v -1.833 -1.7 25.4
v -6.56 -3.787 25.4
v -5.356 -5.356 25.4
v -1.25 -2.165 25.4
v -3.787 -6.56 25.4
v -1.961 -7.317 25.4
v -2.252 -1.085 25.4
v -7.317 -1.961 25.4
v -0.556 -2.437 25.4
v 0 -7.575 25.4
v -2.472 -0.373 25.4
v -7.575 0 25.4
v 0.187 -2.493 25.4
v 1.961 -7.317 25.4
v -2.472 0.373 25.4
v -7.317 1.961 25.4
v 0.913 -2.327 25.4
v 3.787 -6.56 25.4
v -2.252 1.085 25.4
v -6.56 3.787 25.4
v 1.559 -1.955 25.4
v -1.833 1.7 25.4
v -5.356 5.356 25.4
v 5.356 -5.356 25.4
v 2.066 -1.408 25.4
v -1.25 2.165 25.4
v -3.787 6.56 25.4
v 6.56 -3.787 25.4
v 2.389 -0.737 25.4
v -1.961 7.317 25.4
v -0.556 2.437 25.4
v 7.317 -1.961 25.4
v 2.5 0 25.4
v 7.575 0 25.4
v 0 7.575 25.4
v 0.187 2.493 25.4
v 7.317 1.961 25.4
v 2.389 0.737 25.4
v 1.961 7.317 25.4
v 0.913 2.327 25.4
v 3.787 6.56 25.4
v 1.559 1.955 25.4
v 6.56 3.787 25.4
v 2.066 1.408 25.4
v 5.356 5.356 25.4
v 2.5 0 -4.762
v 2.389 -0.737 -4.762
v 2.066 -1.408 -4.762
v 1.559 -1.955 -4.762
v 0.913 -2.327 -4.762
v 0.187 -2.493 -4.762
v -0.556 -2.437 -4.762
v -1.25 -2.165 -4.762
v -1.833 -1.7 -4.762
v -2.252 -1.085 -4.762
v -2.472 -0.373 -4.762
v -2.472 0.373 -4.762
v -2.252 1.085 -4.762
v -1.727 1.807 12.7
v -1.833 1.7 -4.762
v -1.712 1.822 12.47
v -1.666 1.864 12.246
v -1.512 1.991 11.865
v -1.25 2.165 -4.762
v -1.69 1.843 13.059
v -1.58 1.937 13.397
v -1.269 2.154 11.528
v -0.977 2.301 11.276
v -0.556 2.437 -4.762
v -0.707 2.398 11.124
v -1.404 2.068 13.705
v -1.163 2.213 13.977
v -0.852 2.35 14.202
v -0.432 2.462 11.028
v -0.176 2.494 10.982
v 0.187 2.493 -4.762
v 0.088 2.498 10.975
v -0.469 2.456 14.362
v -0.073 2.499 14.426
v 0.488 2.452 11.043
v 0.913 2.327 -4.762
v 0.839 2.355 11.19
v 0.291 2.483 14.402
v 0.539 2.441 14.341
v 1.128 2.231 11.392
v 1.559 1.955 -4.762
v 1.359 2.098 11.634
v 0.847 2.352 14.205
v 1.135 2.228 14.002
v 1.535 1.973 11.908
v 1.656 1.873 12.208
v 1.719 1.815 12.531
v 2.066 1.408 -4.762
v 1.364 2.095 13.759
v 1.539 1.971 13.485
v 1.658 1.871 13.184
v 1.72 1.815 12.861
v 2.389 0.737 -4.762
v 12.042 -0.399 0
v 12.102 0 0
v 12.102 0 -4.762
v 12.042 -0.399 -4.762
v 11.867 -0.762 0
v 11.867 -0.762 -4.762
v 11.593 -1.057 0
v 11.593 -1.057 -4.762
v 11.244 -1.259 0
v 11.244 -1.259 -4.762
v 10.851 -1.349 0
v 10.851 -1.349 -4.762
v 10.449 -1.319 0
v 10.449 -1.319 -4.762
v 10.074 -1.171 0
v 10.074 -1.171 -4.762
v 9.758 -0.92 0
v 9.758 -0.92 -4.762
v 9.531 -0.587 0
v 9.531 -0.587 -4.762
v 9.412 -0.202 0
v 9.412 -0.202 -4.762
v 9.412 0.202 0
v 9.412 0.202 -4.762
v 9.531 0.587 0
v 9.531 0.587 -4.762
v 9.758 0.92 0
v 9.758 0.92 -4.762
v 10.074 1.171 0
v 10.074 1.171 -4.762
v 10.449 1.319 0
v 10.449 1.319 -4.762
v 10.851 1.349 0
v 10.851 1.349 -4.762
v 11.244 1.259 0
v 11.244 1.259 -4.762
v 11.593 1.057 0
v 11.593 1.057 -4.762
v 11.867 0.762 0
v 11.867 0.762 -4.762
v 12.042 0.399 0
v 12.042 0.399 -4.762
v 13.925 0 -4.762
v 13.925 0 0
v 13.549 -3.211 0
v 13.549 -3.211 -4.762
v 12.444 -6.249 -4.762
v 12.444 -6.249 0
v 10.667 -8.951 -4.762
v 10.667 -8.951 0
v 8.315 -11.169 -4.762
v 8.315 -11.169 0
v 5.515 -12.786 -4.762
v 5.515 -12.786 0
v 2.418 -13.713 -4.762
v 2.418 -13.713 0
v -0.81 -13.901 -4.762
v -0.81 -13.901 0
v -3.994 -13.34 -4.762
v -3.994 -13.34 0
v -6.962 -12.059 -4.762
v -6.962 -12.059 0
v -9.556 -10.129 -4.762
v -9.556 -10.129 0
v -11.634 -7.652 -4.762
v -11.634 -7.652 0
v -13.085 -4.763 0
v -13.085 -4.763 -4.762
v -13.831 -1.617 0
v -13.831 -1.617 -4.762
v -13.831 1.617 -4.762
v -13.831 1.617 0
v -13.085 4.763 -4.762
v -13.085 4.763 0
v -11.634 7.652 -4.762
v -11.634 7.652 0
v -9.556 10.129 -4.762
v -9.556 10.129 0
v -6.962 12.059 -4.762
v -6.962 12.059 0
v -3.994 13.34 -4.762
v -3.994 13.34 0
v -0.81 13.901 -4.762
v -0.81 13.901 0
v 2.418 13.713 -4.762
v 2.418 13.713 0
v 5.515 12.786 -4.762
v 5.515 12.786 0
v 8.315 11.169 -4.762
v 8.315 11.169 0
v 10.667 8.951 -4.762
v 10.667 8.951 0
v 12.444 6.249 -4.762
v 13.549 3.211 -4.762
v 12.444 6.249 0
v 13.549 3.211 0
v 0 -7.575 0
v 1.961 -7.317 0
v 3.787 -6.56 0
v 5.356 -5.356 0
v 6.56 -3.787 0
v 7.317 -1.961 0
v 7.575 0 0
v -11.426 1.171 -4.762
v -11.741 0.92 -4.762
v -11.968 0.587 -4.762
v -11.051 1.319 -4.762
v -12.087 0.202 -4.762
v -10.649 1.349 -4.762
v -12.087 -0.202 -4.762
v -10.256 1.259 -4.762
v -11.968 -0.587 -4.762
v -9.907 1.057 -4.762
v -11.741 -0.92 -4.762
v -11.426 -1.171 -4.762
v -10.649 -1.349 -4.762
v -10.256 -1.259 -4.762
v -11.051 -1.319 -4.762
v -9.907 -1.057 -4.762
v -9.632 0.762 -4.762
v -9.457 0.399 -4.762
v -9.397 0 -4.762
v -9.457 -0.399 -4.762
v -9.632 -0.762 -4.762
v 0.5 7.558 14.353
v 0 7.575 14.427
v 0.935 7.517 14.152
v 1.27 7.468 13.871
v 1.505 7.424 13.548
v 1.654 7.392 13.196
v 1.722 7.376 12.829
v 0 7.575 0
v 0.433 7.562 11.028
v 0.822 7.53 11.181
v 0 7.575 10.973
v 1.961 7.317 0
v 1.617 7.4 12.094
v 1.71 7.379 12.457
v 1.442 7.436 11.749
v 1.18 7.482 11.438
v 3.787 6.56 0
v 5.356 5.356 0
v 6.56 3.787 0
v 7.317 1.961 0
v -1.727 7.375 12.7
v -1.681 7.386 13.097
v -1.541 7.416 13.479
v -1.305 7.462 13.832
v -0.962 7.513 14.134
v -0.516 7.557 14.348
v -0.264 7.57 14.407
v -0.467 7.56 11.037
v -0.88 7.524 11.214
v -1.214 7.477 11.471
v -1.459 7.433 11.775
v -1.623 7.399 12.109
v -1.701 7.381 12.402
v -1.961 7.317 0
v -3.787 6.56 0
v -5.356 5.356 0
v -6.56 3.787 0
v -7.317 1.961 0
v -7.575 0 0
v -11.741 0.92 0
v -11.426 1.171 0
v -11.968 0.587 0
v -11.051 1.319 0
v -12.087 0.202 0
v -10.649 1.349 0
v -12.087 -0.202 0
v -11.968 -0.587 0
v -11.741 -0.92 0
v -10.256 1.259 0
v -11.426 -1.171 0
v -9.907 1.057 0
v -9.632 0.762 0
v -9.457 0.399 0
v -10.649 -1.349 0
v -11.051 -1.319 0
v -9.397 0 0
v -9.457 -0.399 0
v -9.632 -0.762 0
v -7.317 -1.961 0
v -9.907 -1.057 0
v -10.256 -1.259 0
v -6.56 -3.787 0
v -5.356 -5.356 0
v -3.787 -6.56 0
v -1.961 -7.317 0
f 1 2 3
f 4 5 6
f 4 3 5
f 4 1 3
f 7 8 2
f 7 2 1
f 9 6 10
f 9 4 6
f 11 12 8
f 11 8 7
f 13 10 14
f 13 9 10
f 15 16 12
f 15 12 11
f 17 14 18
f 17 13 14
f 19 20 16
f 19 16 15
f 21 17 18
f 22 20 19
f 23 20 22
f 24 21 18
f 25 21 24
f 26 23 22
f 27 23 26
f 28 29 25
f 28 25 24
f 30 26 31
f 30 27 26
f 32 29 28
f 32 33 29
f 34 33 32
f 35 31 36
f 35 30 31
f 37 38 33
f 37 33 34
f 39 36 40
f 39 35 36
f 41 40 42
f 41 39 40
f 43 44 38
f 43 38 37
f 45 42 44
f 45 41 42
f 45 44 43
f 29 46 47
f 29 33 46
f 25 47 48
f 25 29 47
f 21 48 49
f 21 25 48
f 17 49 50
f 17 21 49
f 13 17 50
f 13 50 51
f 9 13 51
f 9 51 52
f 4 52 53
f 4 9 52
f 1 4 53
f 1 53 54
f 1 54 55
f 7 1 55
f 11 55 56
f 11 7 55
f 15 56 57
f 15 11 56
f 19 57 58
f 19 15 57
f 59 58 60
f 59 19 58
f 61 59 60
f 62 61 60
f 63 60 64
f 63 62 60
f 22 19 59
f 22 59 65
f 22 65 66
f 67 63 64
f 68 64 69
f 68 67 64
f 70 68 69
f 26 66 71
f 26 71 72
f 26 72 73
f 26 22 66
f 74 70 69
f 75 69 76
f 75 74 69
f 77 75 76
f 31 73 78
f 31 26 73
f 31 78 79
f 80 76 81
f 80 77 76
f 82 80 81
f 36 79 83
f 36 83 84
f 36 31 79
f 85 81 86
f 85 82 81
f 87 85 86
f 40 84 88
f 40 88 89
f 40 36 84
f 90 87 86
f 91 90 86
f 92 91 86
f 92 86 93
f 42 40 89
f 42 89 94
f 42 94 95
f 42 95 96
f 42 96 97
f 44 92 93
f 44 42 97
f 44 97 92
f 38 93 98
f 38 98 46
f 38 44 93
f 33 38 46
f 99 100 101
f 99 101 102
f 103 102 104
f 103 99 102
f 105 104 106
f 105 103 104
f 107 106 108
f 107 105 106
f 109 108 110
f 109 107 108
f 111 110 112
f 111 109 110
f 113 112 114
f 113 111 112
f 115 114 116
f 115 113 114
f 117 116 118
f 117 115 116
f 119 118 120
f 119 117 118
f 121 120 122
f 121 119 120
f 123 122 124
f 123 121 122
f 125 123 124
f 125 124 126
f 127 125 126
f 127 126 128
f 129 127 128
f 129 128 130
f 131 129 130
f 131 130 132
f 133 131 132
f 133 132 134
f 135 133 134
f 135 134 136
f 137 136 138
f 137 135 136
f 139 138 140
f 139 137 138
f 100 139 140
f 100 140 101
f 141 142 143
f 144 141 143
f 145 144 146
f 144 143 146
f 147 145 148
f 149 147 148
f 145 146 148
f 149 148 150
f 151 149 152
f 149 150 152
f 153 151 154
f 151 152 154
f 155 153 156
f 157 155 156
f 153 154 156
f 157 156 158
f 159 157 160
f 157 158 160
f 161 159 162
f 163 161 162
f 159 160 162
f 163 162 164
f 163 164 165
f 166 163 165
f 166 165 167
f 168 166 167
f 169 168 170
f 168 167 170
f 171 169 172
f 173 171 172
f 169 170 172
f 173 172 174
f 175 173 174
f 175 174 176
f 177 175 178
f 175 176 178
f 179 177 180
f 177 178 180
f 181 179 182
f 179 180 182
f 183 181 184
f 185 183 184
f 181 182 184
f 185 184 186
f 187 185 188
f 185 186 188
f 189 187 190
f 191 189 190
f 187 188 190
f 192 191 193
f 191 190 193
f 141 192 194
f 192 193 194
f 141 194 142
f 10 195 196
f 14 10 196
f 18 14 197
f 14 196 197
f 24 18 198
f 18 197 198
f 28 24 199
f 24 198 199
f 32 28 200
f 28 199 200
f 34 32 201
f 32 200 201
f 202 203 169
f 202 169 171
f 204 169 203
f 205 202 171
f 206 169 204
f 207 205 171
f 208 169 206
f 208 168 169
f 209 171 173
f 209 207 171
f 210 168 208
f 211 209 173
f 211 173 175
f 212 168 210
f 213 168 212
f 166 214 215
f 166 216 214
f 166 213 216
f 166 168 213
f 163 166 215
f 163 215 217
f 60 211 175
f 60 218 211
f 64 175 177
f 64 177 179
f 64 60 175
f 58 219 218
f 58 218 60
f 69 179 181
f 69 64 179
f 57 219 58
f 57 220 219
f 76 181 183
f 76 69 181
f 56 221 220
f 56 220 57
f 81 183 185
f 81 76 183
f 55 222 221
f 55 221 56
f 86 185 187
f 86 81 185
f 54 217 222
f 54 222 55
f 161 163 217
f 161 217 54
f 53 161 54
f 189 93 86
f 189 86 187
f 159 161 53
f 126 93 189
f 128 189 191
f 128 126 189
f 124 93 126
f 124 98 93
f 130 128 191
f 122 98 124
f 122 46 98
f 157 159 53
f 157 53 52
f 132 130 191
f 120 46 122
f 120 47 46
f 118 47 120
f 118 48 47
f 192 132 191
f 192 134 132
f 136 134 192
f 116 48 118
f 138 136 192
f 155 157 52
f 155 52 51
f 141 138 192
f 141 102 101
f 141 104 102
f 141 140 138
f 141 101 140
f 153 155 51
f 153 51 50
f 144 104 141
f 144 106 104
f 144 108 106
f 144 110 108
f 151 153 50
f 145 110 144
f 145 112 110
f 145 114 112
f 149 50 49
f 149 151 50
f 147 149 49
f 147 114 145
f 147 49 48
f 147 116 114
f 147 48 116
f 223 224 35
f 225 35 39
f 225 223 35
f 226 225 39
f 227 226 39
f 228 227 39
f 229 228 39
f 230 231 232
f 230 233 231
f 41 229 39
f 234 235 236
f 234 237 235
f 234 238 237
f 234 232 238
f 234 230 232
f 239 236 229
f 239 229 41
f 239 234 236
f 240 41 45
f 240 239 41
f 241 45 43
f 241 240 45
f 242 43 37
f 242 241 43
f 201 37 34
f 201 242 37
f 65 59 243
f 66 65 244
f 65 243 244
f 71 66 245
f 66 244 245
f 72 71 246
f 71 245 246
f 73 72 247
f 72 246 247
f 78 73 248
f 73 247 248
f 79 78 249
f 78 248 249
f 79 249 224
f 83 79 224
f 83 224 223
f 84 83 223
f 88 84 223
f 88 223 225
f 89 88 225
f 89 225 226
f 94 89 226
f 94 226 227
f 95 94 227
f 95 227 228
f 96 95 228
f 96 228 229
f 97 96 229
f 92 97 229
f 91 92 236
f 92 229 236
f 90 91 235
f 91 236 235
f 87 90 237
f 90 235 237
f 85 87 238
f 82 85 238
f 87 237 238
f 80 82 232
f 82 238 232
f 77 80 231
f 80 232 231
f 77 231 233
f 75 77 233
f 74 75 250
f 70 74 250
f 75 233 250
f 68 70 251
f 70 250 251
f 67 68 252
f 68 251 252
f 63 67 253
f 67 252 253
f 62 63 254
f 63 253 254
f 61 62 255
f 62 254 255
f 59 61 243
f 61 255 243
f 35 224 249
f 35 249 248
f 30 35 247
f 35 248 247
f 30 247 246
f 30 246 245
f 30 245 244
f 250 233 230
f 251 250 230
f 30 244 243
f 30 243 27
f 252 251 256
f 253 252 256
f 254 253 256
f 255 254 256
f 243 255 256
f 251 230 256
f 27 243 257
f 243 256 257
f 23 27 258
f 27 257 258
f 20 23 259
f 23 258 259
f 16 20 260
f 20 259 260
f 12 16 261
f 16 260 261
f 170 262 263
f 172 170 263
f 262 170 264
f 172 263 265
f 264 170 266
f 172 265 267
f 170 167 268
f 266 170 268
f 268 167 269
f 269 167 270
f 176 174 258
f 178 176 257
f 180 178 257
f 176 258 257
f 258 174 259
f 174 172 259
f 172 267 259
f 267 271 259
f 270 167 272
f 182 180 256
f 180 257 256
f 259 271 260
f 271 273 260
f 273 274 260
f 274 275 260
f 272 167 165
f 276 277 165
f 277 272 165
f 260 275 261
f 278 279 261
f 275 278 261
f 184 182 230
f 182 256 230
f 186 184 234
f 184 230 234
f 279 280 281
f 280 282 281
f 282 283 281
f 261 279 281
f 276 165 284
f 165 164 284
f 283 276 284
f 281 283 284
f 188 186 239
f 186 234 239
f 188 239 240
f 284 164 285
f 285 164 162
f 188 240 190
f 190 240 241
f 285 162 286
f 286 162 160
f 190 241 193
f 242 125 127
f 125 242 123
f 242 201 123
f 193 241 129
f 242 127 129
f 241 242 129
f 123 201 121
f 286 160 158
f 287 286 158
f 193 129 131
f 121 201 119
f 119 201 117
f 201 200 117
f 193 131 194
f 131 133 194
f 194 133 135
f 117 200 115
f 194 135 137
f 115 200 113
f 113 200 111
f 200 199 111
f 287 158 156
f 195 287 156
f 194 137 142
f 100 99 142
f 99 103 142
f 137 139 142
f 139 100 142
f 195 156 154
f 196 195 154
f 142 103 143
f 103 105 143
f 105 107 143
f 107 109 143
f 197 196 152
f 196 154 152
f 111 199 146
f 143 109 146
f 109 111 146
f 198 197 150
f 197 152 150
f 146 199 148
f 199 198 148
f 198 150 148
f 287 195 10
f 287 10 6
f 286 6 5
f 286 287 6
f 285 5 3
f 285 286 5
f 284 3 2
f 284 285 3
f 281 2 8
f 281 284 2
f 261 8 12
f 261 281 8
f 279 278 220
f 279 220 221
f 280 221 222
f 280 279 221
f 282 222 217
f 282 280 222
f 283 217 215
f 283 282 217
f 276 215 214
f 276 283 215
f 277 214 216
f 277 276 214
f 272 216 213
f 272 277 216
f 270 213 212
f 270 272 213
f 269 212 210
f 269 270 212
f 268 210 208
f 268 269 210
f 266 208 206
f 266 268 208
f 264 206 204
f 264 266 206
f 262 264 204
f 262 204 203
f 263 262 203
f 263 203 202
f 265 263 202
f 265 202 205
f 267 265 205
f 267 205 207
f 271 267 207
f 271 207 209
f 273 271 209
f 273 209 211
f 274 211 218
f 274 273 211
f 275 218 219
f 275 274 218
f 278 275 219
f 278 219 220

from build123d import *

# Parameters (mm, degrees)
F0_W        = 15.1496281502
F0_H        = 15.1496281502
F0_R        = 2.5
F1_DEPTH    = 25.4
F2_R        = 1.7272
F3_REACH    = 20.0358874801
F4_R        = 13.9248140751
F4_R_2      = 1.35255
F4_R_3      = 2.5
F5_DEPTH    = 4.7625
F6_T1_DEPTH = 44.3370335


# Not quite as in the source:
# - a fillet or chamfer that OpenCascade refuses, or shapes differently, is made with other operations: its cross-section is extruded or revolved along the edge and cut away or added


with BuildPart() as f1:
    # F0 (on Top) → F1 (new body)
    with BuildSketch(Plane.XY):
        Rectangle(F0_W, F0_H)
        Circle(F0_R, mode=Mode.SUBTRACT)
    extrude(amount=F1_DEPTH)

    f3_end = f1.faces().sort_by_distance((-2.5, 0, 12.7))[0]
    # F2 (on face) → F3 (cut, up to a face of the model that its end follows)
    with BuildSketch(Plane(origin=(0, 7.5748140751, 0), x_dir=(-1, 0, 0), z_dir=(0, 1, 0))):
        with Locations((0, 12.7)):
            Circle(F2_R)
    f3_long = extrude(amount=-F3_REACH, mode=Mode.PRIVATE)
    add(split(f3_long, bisect_by=f3_end, keep=Keep.ALL, mode=Mode.PRIVATE).solids().sort_by_distance((0, 7.5748140751, 12.7))[0], mode=Mode.SUBTRACT)

    # F4 (on face) → F5 (join)
    with BuildSketch(Plane(origin=(0, 0, 0), x_dir=(1, 0, 0), z_dir=(0, 0, -1))):
        Circle(F4_R)
        with Locations((-10.7498140751, 0)):
            Circle(F4_R_2, mode=Mode.SUBTRACT)
        Circle(F4_R_3, mode=Mode.SUBTRACT)
        with Locations((10.7498140751, 0)):
            Circle(F4_R_2, mode=Mode.SUBTRACT)
    extrude(amount=F5_DEPTH)

    # F6: fillet of radius 7.5748134 on 4 edges, made by hand

    # F6_s2 → F6_t1 (cut)
    with BuildSketch(Plane.XY):
        with BuildLine():
            ThreePointArc((-6.751e-07, 7.5748140751), (-5.3562025965, 5.3562025965), (-7.5748140751, 6.751e-07))
            Line((-7.5748140751, 6.751e-07), (-7.5748140751, 7.5748140751))
            Line((-7.5748140751, 7.5748140751), (-6.751e-07, 7.5748140751))
        make_face()
        with BuildLine():
            ThreePointArc((6.751e-07, 7.5748140751), (5.3562025965, 5.3562025965), (7.5748140751, 6.751e-07))
            Line((7.5748140751, 6.751e-07), (7.5748140751, 7.5748140751))
            Line((7.5748140751, 7.5748140751), (6.751e-07, 7.5748140751))
        make_face()
        with BuildLine():
            ThreePointArc((-6.751e-07, -7.5748140751), (-5.3562025965, -5.3562025965), (-7.5748140751, -6.751e-07))
            Line((-7.5748140751, -6.751e-07), (-7.5748140751, -7.5748140751))
            Line((-7.5748140751, -7.5748140751), (-6.751e-07, -7.5748140751))
        make_face()
        with BuildLine():
            ThreePointArc((6.751e-07, -7.5748140751), (5.3562025965, -5.3562025965), (7.5748140751, -6.751e-07))
            Line((7.5748140751, -6.751e-07), (7.5748140751, -7.5748140751))
            Line((7.5748140751, -7.5748140751), (6.751e-07, -7.5748140751))
        make_face()
    extrude(amount=F6_T1_DEPTH, mode=Mode.SUBTRACT)


solid = f1.part
